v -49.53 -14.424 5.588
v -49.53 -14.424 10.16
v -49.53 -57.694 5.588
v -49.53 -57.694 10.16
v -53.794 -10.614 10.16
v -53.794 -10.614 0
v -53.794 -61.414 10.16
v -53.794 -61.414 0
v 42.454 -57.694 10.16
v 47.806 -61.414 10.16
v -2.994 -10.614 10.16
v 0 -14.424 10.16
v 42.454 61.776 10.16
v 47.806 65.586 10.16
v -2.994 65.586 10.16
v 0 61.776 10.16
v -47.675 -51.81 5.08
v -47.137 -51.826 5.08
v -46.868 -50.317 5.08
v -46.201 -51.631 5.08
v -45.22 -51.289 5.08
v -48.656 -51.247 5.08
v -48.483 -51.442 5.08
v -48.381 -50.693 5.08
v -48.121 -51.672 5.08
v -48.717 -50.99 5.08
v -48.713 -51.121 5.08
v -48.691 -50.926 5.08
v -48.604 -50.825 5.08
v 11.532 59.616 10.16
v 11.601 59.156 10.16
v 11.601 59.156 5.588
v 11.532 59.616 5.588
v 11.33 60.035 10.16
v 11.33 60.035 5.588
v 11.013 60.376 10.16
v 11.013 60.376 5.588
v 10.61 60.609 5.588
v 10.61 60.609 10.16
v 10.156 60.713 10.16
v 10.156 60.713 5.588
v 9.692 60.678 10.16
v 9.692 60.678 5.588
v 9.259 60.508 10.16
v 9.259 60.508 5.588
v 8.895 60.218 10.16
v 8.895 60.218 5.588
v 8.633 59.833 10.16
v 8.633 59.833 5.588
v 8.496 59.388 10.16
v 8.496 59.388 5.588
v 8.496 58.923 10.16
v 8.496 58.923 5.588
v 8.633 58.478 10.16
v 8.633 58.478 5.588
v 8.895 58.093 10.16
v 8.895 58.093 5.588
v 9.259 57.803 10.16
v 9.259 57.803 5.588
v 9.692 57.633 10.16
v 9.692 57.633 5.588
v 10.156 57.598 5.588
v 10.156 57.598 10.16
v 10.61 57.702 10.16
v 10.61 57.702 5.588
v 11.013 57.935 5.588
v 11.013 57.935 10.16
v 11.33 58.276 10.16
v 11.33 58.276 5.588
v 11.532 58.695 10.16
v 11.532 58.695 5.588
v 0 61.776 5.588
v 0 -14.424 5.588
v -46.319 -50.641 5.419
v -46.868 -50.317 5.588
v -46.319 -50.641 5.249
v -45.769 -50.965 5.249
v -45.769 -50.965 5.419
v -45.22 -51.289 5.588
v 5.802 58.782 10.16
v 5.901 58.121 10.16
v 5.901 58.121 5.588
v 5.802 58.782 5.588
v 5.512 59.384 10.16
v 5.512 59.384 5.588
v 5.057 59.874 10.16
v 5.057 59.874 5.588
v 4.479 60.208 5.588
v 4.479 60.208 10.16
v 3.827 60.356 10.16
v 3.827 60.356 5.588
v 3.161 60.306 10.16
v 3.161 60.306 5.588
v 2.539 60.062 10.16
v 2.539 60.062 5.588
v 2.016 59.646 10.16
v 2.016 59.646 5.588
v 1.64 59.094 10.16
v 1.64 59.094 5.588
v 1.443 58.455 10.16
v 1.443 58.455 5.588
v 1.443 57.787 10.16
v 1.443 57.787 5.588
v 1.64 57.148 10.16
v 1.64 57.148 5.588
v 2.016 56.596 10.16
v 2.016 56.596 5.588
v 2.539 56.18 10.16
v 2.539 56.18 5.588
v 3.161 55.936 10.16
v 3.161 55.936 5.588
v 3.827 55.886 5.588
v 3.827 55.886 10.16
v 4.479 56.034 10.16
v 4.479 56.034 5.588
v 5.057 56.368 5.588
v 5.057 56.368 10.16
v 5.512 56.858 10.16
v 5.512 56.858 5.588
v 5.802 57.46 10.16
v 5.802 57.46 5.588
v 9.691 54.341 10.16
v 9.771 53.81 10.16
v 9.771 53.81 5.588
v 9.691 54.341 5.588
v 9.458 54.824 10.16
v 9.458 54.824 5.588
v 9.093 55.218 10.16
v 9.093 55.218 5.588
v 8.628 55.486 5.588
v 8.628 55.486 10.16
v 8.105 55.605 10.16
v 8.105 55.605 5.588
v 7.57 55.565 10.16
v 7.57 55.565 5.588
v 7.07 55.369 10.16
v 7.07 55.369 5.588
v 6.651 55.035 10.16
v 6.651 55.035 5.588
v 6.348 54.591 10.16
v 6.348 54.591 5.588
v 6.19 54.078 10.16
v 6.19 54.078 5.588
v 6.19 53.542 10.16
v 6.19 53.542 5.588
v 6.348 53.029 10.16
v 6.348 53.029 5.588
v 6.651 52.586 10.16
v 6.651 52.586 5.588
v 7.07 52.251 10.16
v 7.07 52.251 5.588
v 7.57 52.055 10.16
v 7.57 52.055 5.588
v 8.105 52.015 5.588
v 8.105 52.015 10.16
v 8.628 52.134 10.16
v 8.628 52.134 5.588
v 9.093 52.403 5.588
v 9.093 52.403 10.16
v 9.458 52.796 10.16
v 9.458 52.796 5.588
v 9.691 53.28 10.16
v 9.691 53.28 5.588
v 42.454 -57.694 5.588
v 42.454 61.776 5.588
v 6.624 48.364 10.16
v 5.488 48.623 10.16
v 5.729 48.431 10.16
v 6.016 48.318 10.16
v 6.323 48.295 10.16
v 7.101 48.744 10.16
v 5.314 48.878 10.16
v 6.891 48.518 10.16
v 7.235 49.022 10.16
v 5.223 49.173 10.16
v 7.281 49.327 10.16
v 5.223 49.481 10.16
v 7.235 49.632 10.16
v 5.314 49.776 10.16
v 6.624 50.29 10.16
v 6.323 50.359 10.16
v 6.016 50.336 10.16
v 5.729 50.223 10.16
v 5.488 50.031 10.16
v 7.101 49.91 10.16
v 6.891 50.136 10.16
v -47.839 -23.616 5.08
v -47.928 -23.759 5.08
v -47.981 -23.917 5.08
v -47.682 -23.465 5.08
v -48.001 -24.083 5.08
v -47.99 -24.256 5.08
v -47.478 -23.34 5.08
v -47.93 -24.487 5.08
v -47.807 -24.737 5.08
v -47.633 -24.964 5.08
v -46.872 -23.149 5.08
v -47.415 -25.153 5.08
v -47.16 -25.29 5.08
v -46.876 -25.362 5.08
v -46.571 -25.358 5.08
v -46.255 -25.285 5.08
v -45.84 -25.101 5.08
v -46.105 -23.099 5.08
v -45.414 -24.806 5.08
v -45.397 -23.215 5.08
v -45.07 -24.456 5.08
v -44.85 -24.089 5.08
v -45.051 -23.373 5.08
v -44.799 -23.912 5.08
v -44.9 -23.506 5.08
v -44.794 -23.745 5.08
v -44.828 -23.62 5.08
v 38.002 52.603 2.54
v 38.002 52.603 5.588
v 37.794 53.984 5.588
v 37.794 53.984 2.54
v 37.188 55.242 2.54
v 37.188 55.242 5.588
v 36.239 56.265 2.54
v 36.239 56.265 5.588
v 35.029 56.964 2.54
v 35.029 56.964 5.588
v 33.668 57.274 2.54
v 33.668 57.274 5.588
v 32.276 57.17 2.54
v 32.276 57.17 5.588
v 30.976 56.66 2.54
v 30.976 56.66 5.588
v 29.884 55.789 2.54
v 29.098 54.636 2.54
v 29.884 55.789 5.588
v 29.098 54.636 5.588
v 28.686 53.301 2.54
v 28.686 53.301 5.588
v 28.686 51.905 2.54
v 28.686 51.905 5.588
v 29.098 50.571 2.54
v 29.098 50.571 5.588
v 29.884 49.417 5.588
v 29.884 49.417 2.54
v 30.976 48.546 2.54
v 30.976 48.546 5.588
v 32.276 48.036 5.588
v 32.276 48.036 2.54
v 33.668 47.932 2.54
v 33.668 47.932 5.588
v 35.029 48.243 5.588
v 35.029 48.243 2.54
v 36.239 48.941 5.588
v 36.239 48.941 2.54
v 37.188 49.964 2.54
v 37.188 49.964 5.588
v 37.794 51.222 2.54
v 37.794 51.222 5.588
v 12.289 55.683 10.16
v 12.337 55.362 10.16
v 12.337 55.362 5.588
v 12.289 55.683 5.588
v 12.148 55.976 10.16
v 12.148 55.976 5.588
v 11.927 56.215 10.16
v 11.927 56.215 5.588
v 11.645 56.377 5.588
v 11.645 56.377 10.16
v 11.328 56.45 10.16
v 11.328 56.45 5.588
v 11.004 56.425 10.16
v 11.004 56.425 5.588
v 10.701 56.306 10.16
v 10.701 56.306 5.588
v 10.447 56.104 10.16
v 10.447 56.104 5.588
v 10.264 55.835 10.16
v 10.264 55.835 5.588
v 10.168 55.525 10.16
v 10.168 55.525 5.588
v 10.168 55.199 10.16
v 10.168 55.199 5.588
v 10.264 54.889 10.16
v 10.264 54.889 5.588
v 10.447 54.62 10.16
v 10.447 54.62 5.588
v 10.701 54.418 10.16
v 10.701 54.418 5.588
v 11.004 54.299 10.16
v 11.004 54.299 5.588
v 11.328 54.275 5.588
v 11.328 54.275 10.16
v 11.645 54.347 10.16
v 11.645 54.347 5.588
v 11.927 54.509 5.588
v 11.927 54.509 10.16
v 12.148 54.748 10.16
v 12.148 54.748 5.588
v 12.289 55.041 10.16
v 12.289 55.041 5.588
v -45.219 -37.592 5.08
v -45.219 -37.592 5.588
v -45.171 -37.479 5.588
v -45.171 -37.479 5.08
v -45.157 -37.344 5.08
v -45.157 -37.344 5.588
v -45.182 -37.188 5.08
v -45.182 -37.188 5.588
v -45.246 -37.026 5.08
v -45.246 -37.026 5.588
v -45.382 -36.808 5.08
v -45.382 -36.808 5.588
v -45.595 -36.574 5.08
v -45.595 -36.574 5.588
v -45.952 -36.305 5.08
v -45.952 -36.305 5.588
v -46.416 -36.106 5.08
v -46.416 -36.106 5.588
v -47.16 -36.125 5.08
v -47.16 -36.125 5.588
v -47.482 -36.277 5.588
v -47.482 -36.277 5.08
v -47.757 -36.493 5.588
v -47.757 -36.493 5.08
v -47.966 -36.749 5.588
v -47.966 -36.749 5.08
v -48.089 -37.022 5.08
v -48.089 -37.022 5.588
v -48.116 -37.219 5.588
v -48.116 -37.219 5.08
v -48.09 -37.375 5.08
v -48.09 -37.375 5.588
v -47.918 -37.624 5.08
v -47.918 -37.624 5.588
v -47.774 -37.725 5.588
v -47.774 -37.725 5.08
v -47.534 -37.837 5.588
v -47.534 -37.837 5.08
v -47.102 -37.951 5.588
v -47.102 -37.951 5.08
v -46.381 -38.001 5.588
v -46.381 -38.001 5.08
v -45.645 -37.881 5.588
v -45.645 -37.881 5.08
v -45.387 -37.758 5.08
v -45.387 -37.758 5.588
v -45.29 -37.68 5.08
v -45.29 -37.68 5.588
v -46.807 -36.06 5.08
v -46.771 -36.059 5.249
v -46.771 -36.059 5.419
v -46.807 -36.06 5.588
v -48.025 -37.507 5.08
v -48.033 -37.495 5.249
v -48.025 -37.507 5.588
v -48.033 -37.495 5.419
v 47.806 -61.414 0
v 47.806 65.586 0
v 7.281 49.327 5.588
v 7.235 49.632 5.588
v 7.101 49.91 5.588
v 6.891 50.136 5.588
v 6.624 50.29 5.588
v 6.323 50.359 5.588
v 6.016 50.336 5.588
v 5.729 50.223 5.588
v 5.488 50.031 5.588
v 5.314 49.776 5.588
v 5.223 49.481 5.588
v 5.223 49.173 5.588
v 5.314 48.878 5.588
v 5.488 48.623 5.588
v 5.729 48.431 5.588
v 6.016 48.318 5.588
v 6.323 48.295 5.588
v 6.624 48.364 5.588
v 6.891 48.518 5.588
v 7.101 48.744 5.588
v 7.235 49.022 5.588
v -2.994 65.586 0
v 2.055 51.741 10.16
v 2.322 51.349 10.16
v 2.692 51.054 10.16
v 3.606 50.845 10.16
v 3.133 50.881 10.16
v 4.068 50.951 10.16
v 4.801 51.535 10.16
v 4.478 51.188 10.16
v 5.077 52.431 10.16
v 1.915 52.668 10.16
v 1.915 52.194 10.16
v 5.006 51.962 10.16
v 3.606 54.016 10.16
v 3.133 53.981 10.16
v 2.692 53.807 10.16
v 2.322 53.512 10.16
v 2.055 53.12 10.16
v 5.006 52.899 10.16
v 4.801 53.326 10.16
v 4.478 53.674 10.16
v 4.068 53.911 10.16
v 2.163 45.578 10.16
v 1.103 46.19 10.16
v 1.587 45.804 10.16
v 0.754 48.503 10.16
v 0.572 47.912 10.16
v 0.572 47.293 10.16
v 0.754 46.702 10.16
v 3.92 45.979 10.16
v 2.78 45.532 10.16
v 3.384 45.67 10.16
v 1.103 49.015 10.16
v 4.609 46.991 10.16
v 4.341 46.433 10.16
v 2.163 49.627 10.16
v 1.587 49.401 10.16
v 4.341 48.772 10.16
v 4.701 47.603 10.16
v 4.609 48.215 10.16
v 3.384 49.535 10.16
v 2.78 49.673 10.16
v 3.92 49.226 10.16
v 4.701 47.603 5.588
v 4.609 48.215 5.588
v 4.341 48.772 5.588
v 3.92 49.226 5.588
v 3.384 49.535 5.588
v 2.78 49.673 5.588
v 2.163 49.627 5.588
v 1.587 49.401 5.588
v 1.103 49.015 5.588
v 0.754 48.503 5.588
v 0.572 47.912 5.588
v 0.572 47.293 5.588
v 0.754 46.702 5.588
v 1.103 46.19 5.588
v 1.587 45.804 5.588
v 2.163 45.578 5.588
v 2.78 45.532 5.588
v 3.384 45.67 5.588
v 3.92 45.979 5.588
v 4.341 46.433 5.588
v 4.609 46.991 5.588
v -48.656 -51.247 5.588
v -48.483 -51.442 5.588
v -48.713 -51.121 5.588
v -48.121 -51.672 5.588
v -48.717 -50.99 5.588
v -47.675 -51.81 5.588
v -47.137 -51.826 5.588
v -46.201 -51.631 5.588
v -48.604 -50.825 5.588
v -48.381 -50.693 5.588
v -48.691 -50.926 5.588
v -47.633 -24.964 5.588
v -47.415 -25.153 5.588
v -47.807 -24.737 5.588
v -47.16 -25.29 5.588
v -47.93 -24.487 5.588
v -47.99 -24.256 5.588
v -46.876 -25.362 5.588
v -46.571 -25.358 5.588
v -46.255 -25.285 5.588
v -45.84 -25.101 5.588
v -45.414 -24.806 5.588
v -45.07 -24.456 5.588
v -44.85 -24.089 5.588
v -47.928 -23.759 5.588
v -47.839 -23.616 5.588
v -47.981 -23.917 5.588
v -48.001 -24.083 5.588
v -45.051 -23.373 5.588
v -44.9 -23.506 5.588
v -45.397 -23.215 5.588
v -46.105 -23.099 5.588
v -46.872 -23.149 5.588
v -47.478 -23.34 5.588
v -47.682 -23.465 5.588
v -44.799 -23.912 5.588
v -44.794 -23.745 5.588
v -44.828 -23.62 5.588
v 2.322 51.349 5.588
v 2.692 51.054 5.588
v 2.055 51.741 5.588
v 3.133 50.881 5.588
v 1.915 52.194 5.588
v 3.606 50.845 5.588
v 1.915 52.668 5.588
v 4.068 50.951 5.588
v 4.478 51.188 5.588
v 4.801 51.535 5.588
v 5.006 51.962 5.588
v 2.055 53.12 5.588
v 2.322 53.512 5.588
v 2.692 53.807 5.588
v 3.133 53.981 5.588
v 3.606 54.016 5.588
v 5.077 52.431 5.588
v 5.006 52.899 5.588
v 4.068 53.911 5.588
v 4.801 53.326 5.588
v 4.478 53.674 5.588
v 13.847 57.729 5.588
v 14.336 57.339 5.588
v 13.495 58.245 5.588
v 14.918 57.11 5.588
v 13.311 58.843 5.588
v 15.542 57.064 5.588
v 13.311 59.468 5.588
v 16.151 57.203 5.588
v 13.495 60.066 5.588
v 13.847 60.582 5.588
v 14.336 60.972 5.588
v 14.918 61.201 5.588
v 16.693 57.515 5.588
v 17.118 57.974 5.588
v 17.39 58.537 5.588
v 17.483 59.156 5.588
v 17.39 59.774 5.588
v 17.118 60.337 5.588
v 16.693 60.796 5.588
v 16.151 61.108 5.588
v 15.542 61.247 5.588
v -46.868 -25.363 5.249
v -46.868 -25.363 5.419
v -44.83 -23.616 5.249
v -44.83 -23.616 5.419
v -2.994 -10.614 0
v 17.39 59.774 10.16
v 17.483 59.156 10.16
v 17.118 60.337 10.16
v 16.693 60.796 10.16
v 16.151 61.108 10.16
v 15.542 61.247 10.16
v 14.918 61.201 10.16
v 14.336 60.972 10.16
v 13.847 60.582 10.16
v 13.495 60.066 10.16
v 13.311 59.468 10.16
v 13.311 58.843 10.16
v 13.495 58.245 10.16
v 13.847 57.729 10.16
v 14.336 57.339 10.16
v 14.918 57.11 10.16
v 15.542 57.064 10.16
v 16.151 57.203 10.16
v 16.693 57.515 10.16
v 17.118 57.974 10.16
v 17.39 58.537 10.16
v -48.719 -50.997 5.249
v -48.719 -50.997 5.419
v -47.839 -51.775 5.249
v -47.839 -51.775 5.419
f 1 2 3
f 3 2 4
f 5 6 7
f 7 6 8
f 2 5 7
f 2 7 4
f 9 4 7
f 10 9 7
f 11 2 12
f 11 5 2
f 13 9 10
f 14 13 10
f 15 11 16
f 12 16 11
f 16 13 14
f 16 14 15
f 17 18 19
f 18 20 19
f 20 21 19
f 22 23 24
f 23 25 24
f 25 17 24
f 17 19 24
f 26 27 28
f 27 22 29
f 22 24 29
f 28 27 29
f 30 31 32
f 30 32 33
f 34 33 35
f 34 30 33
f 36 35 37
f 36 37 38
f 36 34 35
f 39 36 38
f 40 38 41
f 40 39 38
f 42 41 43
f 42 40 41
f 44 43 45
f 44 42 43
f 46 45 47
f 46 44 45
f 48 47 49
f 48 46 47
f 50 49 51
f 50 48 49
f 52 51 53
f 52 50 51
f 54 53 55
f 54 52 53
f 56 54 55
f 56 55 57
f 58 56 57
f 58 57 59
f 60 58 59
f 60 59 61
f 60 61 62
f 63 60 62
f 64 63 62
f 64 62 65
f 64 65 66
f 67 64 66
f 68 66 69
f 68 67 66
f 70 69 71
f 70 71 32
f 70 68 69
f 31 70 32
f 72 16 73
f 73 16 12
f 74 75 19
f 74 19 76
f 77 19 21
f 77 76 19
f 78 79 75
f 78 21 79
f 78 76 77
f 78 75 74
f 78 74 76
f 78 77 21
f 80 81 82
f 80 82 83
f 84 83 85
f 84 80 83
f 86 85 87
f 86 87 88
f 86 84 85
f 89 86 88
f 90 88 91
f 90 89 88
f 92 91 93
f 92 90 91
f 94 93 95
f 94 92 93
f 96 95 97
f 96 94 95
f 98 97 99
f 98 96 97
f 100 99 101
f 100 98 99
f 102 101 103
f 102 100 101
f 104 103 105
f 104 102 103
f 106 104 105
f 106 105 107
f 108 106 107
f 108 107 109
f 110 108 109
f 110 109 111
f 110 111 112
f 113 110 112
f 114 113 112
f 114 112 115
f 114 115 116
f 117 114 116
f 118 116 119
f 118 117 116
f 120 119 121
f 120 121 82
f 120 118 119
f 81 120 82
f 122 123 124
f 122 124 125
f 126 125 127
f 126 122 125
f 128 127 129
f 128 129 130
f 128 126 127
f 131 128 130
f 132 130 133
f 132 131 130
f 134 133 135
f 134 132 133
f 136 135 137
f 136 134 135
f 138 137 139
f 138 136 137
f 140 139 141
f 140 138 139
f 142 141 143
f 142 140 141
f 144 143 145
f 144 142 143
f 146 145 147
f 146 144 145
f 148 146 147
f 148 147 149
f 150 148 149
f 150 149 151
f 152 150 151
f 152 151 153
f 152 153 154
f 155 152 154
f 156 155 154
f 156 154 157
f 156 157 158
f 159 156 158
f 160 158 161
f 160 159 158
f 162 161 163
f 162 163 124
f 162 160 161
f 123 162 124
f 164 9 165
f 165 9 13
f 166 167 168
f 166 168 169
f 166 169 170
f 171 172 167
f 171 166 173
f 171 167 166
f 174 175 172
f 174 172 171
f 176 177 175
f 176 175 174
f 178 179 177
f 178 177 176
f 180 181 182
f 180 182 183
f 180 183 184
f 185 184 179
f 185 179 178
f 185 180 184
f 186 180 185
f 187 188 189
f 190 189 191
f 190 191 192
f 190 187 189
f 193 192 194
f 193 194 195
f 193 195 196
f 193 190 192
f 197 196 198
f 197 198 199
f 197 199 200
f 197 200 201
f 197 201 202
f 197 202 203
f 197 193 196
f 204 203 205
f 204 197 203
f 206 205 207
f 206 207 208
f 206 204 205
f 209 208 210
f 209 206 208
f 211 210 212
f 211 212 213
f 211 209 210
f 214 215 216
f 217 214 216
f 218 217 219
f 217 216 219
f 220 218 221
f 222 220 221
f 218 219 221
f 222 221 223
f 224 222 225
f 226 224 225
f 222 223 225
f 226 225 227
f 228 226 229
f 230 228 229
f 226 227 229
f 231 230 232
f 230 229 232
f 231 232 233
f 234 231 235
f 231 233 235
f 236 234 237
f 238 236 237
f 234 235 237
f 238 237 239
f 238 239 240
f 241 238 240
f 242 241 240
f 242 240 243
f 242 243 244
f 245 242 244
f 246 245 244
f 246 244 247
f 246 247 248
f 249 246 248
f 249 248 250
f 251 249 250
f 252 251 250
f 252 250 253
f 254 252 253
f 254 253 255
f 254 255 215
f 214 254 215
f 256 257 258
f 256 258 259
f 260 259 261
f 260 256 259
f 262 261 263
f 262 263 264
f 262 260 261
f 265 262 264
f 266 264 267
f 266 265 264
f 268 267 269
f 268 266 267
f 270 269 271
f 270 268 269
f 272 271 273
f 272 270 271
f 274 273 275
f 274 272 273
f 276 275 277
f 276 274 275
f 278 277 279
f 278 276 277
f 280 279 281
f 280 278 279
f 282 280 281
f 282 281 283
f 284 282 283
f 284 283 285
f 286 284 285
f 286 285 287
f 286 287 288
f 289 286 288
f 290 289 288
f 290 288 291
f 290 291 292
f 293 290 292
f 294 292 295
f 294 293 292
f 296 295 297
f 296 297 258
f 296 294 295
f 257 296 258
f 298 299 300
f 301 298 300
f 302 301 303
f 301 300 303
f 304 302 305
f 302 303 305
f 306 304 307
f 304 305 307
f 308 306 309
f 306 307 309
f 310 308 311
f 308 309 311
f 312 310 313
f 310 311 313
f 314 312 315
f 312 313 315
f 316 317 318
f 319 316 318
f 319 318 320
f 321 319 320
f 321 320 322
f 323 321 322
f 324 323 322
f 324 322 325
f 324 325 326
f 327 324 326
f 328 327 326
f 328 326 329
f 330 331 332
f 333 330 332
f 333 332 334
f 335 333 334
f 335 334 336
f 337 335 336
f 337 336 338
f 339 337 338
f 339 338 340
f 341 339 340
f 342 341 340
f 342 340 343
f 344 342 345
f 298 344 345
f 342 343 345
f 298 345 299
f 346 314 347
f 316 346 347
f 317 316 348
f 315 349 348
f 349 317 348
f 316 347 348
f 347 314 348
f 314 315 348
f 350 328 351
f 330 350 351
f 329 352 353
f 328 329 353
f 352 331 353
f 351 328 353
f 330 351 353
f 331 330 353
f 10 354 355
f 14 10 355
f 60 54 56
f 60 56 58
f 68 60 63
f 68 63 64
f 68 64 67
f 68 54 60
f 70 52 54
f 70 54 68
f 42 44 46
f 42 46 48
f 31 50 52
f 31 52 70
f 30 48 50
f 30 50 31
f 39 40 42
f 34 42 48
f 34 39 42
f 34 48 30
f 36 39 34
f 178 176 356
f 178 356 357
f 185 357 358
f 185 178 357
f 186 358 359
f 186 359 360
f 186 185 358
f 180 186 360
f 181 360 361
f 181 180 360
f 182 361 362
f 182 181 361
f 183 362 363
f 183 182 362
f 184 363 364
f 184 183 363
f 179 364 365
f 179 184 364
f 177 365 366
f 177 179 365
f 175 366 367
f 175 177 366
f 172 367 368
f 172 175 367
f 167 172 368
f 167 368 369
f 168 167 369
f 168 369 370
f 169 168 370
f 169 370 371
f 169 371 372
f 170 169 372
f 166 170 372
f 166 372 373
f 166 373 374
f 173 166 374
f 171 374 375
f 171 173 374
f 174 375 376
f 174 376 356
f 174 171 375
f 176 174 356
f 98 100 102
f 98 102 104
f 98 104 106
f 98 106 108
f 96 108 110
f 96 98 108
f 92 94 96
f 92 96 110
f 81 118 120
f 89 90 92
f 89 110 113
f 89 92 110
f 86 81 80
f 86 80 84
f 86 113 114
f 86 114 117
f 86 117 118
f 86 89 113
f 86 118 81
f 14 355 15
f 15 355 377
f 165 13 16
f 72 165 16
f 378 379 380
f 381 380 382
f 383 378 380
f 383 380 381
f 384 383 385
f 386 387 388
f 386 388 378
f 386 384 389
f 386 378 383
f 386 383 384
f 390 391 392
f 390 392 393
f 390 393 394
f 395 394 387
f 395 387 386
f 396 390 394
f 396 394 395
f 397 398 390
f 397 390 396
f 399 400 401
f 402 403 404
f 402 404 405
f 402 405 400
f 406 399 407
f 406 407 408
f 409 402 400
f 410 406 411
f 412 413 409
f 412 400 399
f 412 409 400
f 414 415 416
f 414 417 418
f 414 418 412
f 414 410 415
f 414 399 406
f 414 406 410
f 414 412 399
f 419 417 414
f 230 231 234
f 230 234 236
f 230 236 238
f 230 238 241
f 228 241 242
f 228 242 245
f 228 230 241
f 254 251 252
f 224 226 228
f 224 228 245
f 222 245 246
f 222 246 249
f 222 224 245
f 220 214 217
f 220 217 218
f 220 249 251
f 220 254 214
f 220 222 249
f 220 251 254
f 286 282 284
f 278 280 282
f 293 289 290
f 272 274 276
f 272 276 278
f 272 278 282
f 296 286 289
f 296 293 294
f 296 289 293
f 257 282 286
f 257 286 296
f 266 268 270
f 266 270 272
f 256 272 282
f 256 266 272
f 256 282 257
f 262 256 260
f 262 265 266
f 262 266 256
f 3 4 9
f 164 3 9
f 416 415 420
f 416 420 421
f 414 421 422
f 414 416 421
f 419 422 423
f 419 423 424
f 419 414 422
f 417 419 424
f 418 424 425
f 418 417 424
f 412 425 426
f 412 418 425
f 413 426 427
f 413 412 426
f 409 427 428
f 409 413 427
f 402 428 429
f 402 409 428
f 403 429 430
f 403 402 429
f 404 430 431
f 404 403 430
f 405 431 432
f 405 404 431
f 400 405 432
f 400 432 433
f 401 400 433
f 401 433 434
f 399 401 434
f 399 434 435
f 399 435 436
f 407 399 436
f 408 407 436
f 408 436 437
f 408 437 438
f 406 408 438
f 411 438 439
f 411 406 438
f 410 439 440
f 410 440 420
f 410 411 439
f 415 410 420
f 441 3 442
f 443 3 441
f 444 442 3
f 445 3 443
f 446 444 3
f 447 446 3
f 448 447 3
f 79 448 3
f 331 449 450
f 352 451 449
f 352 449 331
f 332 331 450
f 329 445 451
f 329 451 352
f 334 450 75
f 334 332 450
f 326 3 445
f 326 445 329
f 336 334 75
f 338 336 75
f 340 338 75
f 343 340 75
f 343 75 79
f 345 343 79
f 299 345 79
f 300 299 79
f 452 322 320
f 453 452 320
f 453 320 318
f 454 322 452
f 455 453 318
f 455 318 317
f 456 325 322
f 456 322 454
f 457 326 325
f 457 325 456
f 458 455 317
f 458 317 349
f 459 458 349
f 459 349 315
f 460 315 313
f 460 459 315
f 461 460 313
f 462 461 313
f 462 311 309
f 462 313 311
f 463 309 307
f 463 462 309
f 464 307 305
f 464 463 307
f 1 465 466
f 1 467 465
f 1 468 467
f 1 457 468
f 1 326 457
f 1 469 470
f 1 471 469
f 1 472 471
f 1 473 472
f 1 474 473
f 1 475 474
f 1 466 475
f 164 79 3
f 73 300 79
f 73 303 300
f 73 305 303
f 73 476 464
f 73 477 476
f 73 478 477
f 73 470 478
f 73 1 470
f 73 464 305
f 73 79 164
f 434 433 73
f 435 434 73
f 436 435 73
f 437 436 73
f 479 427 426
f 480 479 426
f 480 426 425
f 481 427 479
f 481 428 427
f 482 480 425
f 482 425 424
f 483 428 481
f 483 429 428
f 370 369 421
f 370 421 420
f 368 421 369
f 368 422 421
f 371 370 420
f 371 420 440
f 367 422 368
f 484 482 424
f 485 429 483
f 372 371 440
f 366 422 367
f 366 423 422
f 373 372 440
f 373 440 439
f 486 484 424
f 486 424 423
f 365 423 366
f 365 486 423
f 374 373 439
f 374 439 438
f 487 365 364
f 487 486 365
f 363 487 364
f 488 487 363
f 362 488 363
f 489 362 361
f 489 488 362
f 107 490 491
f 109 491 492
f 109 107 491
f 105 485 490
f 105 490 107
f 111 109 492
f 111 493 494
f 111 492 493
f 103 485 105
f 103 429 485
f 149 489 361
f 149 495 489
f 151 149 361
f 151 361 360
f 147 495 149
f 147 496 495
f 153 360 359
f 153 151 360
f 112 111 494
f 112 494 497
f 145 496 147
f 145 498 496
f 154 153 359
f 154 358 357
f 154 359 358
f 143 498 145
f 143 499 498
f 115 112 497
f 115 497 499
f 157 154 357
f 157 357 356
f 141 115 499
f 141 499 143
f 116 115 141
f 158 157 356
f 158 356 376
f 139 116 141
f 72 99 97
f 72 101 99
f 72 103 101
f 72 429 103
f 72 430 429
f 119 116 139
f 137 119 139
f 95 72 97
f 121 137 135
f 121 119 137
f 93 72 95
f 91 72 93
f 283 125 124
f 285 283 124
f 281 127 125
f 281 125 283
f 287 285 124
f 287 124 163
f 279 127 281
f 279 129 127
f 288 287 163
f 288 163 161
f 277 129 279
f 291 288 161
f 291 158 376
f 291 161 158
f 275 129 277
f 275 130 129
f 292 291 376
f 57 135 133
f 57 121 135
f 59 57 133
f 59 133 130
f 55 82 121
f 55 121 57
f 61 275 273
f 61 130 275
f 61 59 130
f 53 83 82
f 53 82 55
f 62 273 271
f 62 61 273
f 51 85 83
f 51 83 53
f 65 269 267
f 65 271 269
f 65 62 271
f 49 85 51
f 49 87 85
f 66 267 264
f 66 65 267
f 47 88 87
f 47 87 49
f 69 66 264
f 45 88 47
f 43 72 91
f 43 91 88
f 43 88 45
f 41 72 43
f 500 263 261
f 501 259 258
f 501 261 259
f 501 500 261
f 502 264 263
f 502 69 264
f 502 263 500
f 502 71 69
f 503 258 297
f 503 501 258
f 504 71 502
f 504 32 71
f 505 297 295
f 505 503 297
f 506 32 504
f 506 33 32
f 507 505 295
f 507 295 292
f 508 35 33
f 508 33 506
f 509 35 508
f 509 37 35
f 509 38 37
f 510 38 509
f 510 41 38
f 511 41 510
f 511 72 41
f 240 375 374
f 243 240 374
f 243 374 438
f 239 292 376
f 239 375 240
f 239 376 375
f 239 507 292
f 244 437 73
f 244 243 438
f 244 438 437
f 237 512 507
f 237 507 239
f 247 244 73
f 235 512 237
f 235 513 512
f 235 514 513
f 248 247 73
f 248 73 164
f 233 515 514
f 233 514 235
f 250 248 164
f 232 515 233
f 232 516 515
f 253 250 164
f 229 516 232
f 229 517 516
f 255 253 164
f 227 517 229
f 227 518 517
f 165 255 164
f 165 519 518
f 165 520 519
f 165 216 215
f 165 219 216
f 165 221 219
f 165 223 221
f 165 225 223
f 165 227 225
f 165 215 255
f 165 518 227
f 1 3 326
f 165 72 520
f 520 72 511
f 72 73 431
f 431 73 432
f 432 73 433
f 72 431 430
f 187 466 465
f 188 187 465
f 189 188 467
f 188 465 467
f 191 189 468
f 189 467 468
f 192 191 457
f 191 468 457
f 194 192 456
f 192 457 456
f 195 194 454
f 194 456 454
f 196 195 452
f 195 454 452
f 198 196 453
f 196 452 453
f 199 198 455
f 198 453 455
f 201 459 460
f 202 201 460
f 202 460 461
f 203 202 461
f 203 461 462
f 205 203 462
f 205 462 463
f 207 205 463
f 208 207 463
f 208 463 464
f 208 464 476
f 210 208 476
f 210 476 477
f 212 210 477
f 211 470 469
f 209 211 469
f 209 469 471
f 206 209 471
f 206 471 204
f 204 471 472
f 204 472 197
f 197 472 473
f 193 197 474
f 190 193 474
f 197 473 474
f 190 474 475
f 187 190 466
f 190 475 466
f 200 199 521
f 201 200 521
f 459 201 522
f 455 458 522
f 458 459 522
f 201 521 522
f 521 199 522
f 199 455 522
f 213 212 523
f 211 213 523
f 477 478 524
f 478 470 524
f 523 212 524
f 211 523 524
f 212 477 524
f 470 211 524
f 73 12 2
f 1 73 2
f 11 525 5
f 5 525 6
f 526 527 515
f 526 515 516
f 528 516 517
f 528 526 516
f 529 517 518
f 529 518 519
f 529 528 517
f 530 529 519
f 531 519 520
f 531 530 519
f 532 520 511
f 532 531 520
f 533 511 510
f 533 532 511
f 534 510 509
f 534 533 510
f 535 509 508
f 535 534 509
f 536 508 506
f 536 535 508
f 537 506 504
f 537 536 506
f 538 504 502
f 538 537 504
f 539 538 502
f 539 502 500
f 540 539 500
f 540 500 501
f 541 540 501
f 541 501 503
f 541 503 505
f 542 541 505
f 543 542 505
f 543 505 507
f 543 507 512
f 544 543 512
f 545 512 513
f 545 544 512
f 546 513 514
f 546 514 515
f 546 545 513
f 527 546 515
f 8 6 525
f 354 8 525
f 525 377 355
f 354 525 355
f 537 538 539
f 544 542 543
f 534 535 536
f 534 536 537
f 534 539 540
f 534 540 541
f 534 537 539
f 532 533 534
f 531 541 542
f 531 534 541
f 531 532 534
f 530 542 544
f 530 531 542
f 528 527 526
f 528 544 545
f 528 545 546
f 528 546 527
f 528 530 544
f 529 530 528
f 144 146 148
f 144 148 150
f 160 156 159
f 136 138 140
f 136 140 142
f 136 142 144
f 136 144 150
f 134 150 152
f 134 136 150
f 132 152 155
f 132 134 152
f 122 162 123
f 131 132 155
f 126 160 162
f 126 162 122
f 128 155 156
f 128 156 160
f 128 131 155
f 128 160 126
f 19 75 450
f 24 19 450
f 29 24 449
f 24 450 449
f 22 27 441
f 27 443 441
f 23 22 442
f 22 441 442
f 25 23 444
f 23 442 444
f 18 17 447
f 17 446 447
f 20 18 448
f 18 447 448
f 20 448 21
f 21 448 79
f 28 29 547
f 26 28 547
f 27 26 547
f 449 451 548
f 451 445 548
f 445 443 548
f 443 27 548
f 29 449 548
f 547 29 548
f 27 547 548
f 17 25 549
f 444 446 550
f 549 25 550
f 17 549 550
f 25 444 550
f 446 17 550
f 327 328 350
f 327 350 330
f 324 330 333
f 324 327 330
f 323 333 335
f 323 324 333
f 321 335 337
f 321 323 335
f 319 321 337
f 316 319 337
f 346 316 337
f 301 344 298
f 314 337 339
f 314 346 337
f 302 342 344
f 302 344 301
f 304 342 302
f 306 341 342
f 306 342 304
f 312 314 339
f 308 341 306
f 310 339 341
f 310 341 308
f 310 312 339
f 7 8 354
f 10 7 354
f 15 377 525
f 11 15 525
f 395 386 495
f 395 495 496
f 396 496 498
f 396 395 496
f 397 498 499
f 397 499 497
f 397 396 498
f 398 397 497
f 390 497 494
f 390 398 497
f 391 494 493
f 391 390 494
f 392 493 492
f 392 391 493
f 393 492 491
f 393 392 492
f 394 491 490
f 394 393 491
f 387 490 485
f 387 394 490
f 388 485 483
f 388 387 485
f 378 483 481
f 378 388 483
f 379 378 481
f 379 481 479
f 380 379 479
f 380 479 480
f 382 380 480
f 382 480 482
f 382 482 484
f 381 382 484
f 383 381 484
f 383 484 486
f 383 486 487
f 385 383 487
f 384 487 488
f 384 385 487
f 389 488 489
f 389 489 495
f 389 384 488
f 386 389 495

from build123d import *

# Parameters (mm, degrees)
F1_DEPTH = 10.16
F3_DEPTH = 5.08
F2_R     = 2.0763624022
F2_R_2   = 1.0345950723
F2_R_3   = 1.5897491602
F2_R_4   = 2.2416189492
F2_R_5   = 1.8002482779
F2_R_6   = 1.0905586669
F2_R_7   = 1.5614432183
F2_R_8   = 2.0977283719
F2_R_9   = 4.6843284207
F4_DEPTH = 4.572
F5_DEPTH = 7.62
F6_DEPTH = 0.762


# Not quite as in the source:
# - the program builds the solid bodies; features that only make, move or delete a surface that nothing else refers to are left out


with BuildPart() as f1:
    # F0 (on Top) → F1 (new body)
    with BuildSketch(Plane.XY):
        Polygon((47.8064281952, 65.5864290789), (-2.9935718048, 65.5864290789), (-2.9935718048, -10.6135709211), (-53.7935718048, -10.6135709211), (-53.7935718048, -61.4135709211), (47.8064281952, -61.4135709211), align=None)
    extrude(amount=F1_DEPTH)

    # F2 (on face) → F3 (cut)
    with BuildSketch(Plane.XY.offset(10.16)):
        with BuildLine():
            add(Edge.make_bspline(
                [(-47.8390082717, -23.6159972847), (-48.3000888755, -24.195855305), (-47.0430336613, -26.5169441972), (-43.1187716407, -22.9708090315), (-47.273269231, -22.904520121), (-47.8390082717, -23.6159972847)],
                knots=[0, 0, 0, 0, 0.2953373029, 0.6376255235, 1, 1, 1, 1], degree=3))
        make_face()
        with BuildLine():
            add(Edge.make_bspline(
                [(-45.2185384929, -37.5918187201), (-44.8986430919, -37.0721449164), (-46.7922945126, -35.0952494412), (-49.3003635487, -38.0785129033), (-45.5819638525, -38.1822074482), (-45.2185384929, -37.5918187201)],
                knots=[0, 0, 0, 0, 0.3255188332, 0.6301859964, 1, 1, 1, 1], degree=3))
        make_face()
        with BuildLine():
            add(Edge.make_bspline(
                [(-46.8684621155, -50.3168739378), (-46.3188154002, -50.6408562263), (-45.7691686849, -50.9648385147), (-45.2195219696, -51.2888208032)],
                knots=[0, 0, 0, 0, 1.9140753157, 1.9140753157, 1.9140753157, 1.9140753157], degree=3))
            add(Edge.make_bspline(
                [(-46.8684621155, -50.3168739378), (-47.7573276365, -50.4835154275), (-49.3321466932, -50.7787571568), (-47.6954089883, -52.20576886), (-46.1489762809, -51.633045446), (-45.2195219696, -51.2888208032)],
                knots=[0, 0, 0, 0, 0.340798916, 0.6037995791, 1, 1, 1, 1], degree=3))
        make_face()
    extrude(amount=-F3_DEPTH, mode=Mode.SUBTRACT)

    # F2 (on face) → F4 (cut)
    with BuildSketch(Plane.XY.offset(10.16)):
        with BuildLine():
            Line((0, -14.423571527), (-49.5299994946, -14.423571527))
            Line((-49.5299994946, -14.423571527), (-49.5299994946, -57.694286108))
            Line((-49.5299994946, -57.694286108), (12.2464280576, -57.694286108))
            add(Edge.make_bspline(
                [(12.2464280576, -57.694286108), (11.03689249, -55.1284041984), (8.8262402555, -50.4387756091), (16.830567108, -50.610538154), (11.543684395, -41.4140537661), (24.3541608342, -47.2929208414), (18.6630964396, -34.0142041282), (32.3027129745, -41.5037229838), (28.8060301659, -27.219324679), (39.7417437225, -32.4995208739), (41.581315462, -27.9924233376), (42.4542874098, -25.8535724133)],
                knots=[0, 0, 0, 0, 0.1112734122, 0.2033729508, 0.3034169687, 0.4180959772, 0.5306525521, 0.6520560864, 0.7731880867, 0.8923660146, 1, 1, 1, 1], degree=3))
            Line((42.4542874098, -25.8535724133), (42.4542874098, 61.7764294147))
            Line((42.4542874098, 61.7764294147), (0, 61.7764294147))
            Line((0, 61.7764294147), (0, -14.423571527))
        make_face()
        with BuildLine():
            add(Edge.make_bspline(
                [(-46.8684621155, -50.3168739378), (-47.7573276365, -50.4835154275), (-49.3321466932, -50.7787571568), (-47.6954089883, -52.20576886), (-46.1489762809, -51.633045446), (-45.2195219696, -51.2888208032)],
                knots=[0, 0, 0, 0, 0.340798916, 0.6037995791, 1, 1, 1, 1], degree=3))
            add(Edge.make_bspline(
                [(-46.8684621155, -50.3168739378), (-46.3188154002, -50.6408562263), (-45.7691686849, -50.9648385147), (-45.2195219696, -51.2888208032)],
                knots=[0, 0, 0, 0, 1.9140753157, 1.9140753157, 1.9140753157, 1.9140753157], degree=3))
        make_face(mode=Mode.SUBTRACT)
        with BuildLine():
            add(Edge.make_bspline(
                [(-45.2185384929, -37.5918187201), (-44.8986430919, -37.0721449164), (-46.7922945126, -35.0952494412), (-49.3003635487, -38.0785129033), (-45.5819638525, -38.1822074482), (-45.2185384929, -37.5918187201)],
                knots=[0, 0, 0, 0, 0.3255188332, 0.6301859964, 1, 1, 1, 1], degree=3))
        make_face(mode=Mode.SUBTRACT)
        with BuildLine():
            add(Edge.make_bspline(
                [(-47.8390082717, -23.6159972847), (-48.3000888755, -24.195855305), (-47.0430336613, -26.5169441972), (-43.1187716407, -22.9708090315), (-47.273269231, -22.904520121), (-47.8390082717, -23.6159972847)],
                knots=[0, 0, 0, 0, 0.2953373029, 0.6376255235, 1, 1, 1, 1], degree=3))
        make_face(mode=Mode.SUBTRACT)
        with Locations((2.6250390802, 47.6025752723)):
            Circle(F2_R, mode=Mode.SUBTRACT)
        with Locations((6.2461188063, 49.3268966675)):
            Circle(F2_R_2, mode=Mode.SUBTRACT)
        with Locations((3.4872009419, 52.4306818843)):
            Circle(F2_R_3, mode=Mode.SUBTRACT)
        with Locations((3.6596332211, 58.1209473312)):
            Circle(F2_R_4, mode=Mode.SUBTRACT)
        with Locations((7.9704420641, 53.8101382554)):
            Circle(F2_R_5, mode=Mode.SUBTRACT)
        with Locations((11.2466607243, 55.3620308638)):
            Circle(F2_R_6, mode=Mode.SUBTRACT)
        with Locations((10.0396340713, 59.1555424035)):
            Circle(F2_R_7, mode=Mode.SUBTRACT)
        with Locations((15.3850372881, 59.1555424035)):
            Circle(F2_R_8, mode=Mode.SUBTRACT)
        with Locations((33.3180055022, 52.6031143963)):
            Circle(F2_R_9, mode=Mode.SUBTRACT)
        with BuildLine():
            add(Edge.make_bspline(
                [(12.2464280576, -57.694286108), (11.03689249, -55.1284041984), (8.8262402555, -50.4387756091), (16.830567108, -50.610538154), (11.543684395, -41.4140537661), (24.3541608342, -47.2929208414), (18.6630964396, -34.0142041282), (32.3027129745, -41.5037229838), (28.8060301659, -27.219324679), (39.7417437225, -32.4995208739), (41.581315462, -27.9924233376), (42.4542874098, -25.8535724133)],
                knots=[0, 0, 0, 0, 0.1112734122, 0.2033729508, 0.3034169687, 0.4180959772, 0.5306525521, 0.6520560864, 0.7731880867, 0.8923660146, 1, 1, 1, 1], degree=3))
            Line((12.2464280576, -57.694286108), (42.4542874098, -57.694286108))
            Line((42.4542874098, -57.694286108), (42.4542874098, -25.8535724133))
        make_face()
    extrude(amount=-F4_DEPTH, mode=Mode.SUBTRACT)

    # F5 (cut): a face of the model
    f5_faces = [f1.faces().sort_by_distance(p)[0] for p in [
        (33.3180055022, 52.6031143963, 10.16),
    ]]
    extrude(f5_faces, amount=-F5_DEPTH, mode=Mode.SUBTRACT)

    # F2 (on face) → F6 (cut)
    with BuildSketch(Plane.XY.offset(10.16)):
        with BuildLine():
            add(Edge.make_bspline(
                [(12.2464280576, -57.694286108), (11.03689249, -55.1284041984), (8.8262402555, -50.4387756091), (16.830567108, -50.610538154), (11.543684395, -41.4140537661), (24.3541608342, -47.2929208414), (18.6630964396, -34.0142041282), (32.3027129745, -41.5037229838), (28.8060301659, -27.219324679), (39.7417437225, -32.4995208739), (41.581315462, -27.9924233376), (42.4542874098, -25.8535724133)],
                knots=[0, 0, 0, 0, 0.1112734122, 0.2033729508, 0.3034169687, 0.4180959772, 0.5306525521, 0.6520560864, 0.7731880867, 0.8923660146, 1, 1, 1, 1], degree=3))
            Line((12.2464280576, -57.694286108), (42.4542874098, -57.694286108))
            Line((42.4542874098, -57.694286108), (42.4542874098, -25.8535724133))
        make_face()
    extrude(amount=-F6_DEPTH, mode=Mode.SUBTRACT)


solid = f1.part
